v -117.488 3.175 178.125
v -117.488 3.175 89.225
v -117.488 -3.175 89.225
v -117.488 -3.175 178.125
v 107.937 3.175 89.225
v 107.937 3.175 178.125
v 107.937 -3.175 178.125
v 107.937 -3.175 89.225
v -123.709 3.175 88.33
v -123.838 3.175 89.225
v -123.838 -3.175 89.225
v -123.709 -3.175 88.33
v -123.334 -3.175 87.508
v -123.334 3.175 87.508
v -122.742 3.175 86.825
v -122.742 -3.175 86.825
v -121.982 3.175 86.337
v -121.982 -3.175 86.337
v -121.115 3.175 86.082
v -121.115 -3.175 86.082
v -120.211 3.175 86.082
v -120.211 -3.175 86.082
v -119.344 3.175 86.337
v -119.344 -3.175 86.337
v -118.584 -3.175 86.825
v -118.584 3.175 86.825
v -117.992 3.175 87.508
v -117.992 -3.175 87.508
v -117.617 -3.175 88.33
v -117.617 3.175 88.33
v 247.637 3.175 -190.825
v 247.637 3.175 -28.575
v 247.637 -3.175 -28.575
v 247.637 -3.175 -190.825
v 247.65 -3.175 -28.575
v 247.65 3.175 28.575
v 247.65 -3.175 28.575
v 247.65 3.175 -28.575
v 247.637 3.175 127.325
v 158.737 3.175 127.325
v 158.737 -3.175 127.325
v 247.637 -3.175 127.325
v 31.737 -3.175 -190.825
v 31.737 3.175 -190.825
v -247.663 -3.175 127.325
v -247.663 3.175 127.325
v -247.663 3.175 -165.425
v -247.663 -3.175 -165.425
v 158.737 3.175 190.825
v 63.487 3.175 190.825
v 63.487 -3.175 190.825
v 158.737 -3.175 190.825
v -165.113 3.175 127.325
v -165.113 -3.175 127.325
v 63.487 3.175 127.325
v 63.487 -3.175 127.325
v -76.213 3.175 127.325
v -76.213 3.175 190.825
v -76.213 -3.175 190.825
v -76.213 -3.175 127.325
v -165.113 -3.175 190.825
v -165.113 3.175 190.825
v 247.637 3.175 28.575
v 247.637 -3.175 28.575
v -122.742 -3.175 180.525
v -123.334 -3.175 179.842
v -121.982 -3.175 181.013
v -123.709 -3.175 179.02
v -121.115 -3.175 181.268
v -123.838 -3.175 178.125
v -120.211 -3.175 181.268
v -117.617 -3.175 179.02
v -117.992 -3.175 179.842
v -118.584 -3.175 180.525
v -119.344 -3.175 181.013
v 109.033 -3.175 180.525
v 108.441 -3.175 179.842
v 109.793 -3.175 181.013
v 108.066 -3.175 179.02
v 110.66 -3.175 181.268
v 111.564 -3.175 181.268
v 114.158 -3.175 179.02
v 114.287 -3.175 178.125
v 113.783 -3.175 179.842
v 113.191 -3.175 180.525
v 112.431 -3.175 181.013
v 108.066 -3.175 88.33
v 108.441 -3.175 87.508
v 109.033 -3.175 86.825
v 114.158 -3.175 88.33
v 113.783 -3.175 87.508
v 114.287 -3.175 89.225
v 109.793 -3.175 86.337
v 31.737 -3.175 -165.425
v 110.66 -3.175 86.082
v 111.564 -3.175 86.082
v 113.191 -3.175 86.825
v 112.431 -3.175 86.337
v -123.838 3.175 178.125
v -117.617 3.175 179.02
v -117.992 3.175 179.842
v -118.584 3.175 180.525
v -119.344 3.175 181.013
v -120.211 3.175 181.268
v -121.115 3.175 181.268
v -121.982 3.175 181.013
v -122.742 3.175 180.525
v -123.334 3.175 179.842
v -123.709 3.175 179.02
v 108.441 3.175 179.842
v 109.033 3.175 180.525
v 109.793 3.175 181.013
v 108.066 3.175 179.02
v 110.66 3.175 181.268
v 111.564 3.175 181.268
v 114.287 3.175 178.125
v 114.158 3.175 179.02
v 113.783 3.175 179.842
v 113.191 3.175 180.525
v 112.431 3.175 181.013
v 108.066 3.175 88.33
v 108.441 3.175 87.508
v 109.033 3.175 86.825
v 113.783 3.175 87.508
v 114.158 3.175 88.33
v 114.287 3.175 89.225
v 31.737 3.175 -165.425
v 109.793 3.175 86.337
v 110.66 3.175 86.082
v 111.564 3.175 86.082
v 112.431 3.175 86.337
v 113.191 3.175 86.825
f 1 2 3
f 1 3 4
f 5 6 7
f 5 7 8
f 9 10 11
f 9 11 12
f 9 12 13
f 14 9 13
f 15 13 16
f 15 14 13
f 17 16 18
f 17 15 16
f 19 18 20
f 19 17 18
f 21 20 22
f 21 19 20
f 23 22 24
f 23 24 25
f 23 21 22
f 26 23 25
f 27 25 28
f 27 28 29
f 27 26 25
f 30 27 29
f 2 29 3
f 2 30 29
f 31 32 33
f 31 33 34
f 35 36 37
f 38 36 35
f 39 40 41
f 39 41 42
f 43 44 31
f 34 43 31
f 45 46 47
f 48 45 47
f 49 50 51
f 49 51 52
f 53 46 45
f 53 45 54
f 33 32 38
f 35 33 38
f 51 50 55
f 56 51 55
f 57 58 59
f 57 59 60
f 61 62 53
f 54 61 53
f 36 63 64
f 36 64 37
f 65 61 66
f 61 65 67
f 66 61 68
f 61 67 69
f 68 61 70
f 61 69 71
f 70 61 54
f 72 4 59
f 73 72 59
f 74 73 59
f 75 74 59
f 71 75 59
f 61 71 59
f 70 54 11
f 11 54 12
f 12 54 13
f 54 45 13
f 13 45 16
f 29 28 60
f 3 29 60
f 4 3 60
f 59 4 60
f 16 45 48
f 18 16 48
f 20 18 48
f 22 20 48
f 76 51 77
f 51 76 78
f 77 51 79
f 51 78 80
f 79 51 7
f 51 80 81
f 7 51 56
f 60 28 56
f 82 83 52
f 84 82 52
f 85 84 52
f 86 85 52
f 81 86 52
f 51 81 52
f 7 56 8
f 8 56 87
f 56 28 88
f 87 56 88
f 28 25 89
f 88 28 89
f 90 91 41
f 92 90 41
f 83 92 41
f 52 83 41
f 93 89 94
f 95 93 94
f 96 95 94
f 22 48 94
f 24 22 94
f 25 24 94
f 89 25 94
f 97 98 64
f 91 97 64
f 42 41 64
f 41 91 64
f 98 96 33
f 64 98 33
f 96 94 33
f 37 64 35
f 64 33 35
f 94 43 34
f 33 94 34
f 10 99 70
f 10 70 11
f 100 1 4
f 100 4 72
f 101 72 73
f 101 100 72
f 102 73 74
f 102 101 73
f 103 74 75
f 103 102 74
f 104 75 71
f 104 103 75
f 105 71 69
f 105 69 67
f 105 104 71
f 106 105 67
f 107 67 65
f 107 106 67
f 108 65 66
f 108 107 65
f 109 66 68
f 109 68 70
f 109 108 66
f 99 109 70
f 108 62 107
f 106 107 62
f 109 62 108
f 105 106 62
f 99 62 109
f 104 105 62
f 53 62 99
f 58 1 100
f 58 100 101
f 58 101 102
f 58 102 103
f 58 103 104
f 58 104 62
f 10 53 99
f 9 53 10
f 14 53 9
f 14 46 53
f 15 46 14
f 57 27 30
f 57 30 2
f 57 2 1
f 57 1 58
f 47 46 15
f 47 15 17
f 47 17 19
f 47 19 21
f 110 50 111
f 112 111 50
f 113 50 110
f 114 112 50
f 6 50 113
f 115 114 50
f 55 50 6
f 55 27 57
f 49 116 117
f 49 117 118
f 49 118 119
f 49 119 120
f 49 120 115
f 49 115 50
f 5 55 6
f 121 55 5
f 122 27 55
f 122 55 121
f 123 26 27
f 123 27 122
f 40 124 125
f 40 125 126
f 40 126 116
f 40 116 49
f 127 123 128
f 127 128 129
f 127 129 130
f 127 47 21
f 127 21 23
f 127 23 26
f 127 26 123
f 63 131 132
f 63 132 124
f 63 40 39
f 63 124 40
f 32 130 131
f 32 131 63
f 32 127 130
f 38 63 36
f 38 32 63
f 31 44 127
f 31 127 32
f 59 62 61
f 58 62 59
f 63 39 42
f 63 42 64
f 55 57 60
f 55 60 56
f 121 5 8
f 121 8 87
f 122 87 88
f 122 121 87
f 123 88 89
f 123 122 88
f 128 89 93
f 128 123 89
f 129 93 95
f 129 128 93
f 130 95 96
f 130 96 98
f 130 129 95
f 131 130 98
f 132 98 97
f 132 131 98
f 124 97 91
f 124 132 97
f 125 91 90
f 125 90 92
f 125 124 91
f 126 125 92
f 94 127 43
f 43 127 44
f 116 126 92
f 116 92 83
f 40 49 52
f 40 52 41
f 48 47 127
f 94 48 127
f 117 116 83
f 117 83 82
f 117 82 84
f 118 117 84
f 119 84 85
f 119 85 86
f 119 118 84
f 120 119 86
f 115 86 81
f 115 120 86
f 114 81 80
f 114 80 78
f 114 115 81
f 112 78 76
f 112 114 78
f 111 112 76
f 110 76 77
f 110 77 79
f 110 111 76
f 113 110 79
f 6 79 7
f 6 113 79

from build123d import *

# Parameters (mm, degrees)
SKETCH1_W           = 495.3
SKETCH1_H           = 57.15
BOSS_EXTRUDE1_DEPTH = 3.175
SKETCH23_W          = 495.3
SKETCH23_H          = 381.64999997
BOSS_EXTRUDE3_DEPTH = 3.175
SKETCH24_W          = 88.9
SKETCH24_H          = 63.5
SKETCH24_W_2        = 139.7
SKETCH24_W_3        = 82.55
CUT_EXTRUDE6_DEPTH  = 6.35
CUT_EXTRUDE7_DEPTH  = 6.35
SKETCH27_W          = 279.4
SKETCH27_H          = 25.4
CUT_EXTRUDE8_DEPTH  = 6.35


with BuildPart() as part:
    # Sketch1 → Boss-Extrude1 (new, symmetric)
    with BuildSketch(Plane(origin=(0, 0, 0), x_dir=(1, 0, 0), z_dir=(0, 1, 0))):
        Rectangle(SKETCH1_W, SKETCH1_H)
    extrude(amount=BOSS_EXTRUDE1_DEPTH, both=True)

    # Sketch23 → Boss-Extrude3 (add, symmetric)
    with BuildSketch(Plane(origin=(0, 0, 0), x_dir=(1, 0, 0), z_dir=(0, 1, 0))):
        with Locations((-0.01297497, 0)):
            Rectangle(SKETCH23_W, SKETCH23_H)
    extrude(amount=BOSS_EXTRUDE3_DEPTH, both=True)

    # Sketch24 → Cut-Extrude6 (cut)
    with BuildSketch(Plane(origin=(0, 3.175, 0), x_dir=(1, 0, 0), z_dir=(0, 1, 0))):
        with Locations((203.18702503, -159.074999985)):
            Rectangle(SKETCH24_W, SKETCH24_H)
        with Locations((-6.36297497, -159.074999985)):
            Rectangle(SKETCH24_W_2, SKETCH24_H)
        with Locations((-206.38797497, -159.074999985)):
            Rectangle(SKETCH24_W_3, SKETCH24_H)
    extrude(amount=-CUT_EXTRUDE6_DEPTH, mode=Mode.SUBTRACT)

    # Sketch25 → Cut-Extrude7 (cut)
    with BuildSketch(Plane(origin=(0, 3.175, 0), x_dir=(1, 0, 0), z_dir=(0, 1, 0))):
        with BuildLine():
            Line((114.28702503, -89.224999985), (114.28702503, -178.124999985))
            ThreePointArc((114.28702503, -178.124999985), (111.11202503, -181.299999985), (107.93702503, -178.124999985))
            Line((107.93702503, -178.124999985), (107.93702503, -89.224999985))
            ThreePointArc((107.93702503, -89.224999985), (111.11202503, -86.049999985), (114.28702503, -89.224999985))
        make_face()
        with BuildLine():
            Line((-117.48797497, -89.224999985), (-117.48797497, -178.124999985))
            ThreePointArc((-117.48797497, -178.124999985), (-120.66297497, -181.299999985), (-123.83797497, -178.124999985))
            Line((-123.83797497, -178.124999985), (-123.83797497, -89.224999985))
            ThreePointArc((-123.83797497, -89.224999985), (-120.66297497, -86.049999985), (-117.48797497, -89.224999985))
        make_face()
    extrude(amount=-CUT_EXTRUDE7_DEPTH, mode=Mode.SUBTRACT)

    # Sketch27 → Cut-Extrude8 (cut)
    with BuildSketch(Plane(origin=(0, 3.175, 0), x_dir=(1, 0, 0), z_dir=(0, 1, 0))):
        with Locations((-107.96297497, 178.124999985)):
            Rectangle(SKETCH27_W, SKETCH27_H)
    extrude(amount=-CUT_EXTRUDE8_DEPTH, mode=Mode.SUBTRACT)


solid = part.part
